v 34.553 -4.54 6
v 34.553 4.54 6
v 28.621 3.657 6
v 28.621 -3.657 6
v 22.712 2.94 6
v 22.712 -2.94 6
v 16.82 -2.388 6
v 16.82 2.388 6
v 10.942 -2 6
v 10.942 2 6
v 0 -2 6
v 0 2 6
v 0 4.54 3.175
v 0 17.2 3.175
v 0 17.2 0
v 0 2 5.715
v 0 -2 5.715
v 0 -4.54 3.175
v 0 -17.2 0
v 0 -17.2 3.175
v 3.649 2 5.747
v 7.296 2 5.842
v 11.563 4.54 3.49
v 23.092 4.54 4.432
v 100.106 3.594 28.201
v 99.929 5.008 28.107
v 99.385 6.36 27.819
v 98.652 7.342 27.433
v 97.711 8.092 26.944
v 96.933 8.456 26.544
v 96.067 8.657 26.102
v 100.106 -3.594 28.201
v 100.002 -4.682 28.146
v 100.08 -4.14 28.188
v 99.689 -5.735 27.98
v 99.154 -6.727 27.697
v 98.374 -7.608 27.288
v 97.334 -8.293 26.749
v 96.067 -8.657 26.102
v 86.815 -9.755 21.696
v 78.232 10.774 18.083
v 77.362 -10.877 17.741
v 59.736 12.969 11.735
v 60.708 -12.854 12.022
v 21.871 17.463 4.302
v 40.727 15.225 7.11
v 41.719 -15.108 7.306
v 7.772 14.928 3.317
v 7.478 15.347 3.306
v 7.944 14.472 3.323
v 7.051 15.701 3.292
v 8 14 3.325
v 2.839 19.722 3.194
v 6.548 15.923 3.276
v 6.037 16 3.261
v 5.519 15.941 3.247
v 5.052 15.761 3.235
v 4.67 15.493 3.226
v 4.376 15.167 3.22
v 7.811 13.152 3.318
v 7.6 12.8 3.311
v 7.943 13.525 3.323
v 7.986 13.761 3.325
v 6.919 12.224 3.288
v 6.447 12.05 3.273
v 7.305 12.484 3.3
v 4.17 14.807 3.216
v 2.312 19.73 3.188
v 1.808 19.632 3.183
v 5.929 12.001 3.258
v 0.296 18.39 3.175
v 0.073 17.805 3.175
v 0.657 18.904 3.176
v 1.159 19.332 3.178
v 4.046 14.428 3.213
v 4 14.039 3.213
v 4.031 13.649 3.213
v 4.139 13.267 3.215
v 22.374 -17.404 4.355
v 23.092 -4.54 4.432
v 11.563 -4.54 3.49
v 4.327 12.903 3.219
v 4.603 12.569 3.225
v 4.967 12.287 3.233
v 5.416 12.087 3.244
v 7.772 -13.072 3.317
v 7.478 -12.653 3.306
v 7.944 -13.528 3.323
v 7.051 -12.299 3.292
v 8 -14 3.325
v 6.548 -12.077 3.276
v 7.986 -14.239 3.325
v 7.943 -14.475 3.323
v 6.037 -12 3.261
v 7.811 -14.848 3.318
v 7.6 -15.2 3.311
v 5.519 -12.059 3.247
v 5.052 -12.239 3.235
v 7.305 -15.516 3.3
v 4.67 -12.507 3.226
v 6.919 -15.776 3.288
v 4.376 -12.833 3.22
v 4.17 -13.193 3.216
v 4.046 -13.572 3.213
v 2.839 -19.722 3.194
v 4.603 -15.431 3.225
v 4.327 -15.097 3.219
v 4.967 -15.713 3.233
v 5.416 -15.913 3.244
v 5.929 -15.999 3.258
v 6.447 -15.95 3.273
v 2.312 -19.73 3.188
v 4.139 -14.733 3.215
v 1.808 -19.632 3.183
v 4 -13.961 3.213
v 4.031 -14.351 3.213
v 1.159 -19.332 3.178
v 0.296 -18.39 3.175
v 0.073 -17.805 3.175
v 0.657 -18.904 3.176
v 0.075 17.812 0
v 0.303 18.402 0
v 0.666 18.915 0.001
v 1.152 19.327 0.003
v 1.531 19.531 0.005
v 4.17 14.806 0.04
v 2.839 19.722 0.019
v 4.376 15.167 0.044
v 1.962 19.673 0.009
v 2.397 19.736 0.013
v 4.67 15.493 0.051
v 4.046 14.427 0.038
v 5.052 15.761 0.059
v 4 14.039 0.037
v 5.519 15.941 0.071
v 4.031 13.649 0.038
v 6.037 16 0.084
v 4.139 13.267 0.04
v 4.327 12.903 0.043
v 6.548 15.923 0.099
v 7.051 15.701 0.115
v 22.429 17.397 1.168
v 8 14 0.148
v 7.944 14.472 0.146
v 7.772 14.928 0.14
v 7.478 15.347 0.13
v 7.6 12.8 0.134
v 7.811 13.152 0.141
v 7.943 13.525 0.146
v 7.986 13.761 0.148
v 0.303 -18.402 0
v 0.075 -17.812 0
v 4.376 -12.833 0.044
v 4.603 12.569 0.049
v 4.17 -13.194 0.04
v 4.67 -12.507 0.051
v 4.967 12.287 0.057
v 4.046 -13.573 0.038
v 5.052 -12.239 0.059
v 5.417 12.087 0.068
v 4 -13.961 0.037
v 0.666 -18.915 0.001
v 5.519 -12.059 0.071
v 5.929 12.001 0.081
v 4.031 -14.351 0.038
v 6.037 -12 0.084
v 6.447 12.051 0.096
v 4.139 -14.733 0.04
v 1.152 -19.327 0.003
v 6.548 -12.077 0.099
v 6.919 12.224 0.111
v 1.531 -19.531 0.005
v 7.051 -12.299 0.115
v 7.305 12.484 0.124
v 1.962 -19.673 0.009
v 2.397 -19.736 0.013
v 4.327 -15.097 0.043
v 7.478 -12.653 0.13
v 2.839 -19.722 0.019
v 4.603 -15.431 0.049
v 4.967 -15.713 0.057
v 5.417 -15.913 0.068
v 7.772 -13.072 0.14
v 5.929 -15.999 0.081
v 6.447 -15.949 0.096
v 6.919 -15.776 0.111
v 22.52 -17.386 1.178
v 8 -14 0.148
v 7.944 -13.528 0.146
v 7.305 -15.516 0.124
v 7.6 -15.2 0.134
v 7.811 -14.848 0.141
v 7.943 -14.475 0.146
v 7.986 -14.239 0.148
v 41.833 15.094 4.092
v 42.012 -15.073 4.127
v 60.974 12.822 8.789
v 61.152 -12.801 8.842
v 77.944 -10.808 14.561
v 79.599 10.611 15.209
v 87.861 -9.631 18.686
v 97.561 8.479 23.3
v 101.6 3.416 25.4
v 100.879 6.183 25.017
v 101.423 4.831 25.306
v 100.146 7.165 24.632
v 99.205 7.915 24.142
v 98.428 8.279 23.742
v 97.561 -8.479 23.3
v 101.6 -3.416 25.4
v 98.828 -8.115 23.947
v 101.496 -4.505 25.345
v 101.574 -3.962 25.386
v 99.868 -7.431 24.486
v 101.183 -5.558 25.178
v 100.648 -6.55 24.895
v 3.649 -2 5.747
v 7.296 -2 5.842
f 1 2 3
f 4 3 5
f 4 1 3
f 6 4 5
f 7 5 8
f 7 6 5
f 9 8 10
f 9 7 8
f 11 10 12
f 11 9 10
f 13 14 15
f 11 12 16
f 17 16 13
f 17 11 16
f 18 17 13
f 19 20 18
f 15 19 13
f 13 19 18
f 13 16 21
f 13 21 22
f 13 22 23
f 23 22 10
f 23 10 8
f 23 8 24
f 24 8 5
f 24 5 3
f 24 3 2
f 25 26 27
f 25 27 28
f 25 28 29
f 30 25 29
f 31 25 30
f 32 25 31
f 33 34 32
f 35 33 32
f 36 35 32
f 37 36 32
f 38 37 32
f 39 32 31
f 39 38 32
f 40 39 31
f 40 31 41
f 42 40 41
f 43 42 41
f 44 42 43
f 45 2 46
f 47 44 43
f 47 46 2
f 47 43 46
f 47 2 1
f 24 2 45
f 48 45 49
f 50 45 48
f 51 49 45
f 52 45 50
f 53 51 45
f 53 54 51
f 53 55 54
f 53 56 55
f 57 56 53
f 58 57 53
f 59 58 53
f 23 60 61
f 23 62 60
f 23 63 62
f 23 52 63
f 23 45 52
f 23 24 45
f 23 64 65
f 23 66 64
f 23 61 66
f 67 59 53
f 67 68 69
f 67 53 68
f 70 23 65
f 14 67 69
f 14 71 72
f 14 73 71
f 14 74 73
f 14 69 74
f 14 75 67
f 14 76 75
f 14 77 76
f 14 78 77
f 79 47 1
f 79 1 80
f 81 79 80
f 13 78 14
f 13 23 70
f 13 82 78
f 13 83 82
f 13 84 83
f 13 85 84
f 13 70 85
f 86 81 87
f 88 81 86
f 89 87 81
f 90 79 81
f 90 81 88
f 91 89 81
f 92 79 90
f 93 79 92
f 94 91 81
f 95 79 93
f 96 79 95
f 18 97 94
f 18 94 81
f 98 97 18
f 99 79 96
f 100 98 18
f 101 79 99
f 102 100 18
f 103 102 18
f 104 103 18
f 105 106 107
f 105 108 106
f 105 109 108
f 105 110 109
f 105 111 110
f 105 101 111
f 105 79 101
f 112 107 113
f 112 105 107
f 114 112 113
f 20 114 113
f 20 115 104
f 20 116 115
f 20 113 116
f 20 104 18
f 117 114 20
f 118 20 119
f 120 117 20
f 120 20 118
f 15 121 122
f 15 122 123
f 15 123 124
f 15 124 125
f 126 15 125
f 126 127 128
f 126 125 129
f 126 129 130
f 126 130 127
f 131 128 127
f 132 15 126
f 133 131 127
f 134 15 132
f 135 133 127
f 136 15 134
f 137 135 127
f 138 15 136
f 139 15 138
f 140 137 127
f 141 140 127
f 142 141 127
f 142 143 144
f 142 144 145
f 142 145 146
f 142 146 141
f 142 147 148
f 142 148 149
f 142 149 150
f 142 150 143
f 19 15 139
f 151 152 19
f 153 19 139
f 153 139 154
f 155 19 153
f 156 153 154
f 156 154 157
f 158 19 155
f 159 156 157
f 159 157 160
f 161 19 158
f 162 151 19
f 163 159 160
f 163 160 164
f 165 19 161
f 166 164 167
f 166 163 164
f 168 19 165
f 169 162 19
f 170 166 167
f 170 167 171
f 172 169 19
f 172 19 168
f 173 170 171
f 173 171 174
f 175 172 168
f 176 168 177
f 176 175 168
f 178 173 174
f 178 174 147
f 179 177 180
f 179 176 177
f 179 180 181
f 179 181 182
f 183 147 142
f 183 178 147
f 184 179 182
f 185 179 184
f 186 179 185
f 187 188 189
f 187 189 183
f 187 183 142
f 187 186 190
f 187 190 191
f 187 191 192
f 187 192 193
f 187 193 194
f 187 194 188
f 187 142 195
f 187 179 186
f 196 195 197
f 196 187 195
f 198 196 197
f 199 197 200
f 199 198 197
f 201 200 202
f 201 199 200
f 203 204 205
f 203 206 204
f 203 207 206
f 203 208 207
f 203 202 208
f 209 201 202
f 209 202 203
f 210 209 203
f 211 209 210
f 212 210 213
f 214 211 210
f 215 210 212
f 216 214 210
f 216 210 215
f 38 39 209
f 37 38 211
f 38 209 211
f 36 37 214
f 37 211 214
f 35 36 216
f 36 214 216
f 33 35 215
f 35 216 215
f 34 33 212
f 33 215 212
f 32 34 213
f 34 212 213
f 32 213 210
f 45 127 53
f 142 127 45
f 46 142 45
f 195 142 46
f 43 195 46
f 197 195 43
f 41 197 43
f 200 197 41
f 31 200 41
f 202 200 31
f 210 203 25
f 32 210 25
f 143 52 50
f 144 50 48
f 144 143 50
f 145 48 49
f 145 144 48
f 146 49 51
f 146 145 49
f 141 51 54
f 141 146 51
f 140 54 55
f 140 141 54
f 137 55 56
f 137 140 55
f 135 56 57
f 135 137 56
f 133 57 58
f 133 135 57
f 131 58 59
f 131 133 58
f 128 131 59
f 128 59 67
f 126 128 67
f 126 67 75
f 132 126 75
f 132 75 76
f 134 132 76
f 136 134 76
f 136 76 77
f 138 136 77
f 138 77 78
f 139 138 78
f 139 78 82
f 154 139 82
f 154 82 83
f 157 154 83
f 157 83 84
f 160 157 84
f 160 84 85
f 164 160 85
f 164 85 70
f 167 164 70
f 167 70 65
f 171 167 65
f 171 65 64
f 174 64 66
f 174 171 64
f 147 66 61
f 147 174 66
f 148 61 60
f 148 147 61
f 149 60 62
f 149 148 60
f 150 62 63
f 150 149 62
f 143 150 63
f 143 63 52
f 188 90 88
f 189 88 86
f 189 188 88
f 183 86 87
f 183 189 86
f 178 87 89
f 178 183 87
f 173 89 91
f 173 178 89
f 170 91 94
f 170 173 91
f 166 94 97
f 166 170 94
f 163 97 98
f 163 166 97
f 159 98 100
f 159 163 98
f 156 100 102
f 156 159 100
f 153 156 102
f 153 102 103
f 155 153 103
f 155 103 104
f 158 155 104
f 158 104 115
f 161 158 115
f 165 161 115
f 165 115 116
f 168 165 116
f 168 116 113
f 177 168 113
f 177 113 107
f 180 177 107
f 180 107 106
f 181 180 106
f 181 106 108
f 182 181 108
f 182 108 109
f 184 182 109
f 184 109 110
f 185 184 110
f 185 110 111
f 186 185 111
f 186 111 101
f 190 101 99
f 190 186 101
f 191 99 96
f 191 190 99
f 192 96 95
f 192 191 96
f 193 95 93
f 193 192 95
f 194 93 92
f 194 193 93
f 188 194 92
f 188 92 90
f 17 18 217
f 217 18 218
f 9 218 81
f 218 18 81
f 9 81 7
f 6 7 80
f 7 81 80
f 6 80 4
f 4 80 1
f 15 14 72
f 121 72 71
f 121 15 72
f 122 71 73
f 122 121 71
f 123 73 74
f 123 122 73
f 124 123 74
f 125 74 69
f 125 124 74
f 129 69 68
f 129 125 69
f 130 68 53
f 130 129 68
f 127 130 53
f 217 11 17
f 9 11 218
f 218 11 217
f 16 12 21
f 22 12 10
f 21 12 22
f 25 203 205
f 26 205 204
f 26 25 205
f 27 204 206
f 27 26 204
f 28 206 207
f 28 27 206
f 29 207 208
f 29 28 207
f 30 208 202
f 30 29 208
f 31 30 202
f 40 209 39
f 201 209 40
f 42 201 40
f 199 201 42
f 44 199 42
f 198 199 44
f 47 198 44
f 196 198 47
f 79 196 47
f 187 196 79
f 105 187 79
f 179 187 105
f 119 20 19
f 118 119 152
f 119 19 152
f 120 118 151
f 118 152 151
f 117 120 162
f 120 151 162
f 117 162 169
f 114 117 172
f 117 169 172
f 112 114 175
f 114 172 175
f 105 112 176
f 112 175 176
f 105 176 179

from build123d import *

# Parameters (mm, degrees)
F1_DEPTH      = 20
F1_DEPTH_BACK = 20
F2_R          = 2
F3_DEPTH      = 25.4
F5_DEPTH      = 50.8
F7_DEPTH      = 2
F7_DEPTH_BACK = 2
F8_SIZE       = 2.54
F9_R          = 5.08
F10_T1_DEPTH  = 15.875
F11_T1_DEPTH  = 18.9511481059


# Not quite as in the source:
# - a fillet or chamfer that OpenCascade refuses, or shapes differently, is made with other operations: its cross-section is extruded or revolved along the edge and cut away or added


with BuildPart() as f1:
    # F0 (on Front) → F1 (new body, two sides)
    with BuildSketch(Plane.XZ) as f1_sk:
        with BuildLine():
            Line((0, 3.175), (0, 0))
            ThreePointArc((0, 0), (52.3634414453, 6.4462342186), (101.6, 25.4))
            Line((101.6, 25.4), (100.1058823529, 28.2014705882))
            ThreePointArc((100.1058823529, 28.2014705882), (51.5933908359, 9.5264366566), (0, 3.175))
        make_face()
    extrude(amount=F1_DEPTH)
    extrude(f1_sk.sketch, amount=-F1_DEPTH_BACK)

    # F2 (on Top) → F3 (cut)
    with BuildSketch(Plane.XY):
        with Locations((6, 14)):
            Circle(F2_R)
        with Locations((6, -14)):
            Circle(F2_R)
    extrude(amount=F3_DEPTH, mode=Mode.SUBTRACT)

    # F4 (on Top) → F5 (cut)
    with BuildSketch(Plane.XY):
        Polygon((0.5, 20), (101.6, 8), (101.6, 20), align=None)
        Polygon((101.6, -8), (0.5, -20), (101.6, -20), align=None)
    extrude(amount=F5_DEPTH, mode=Mode.SUBTRACT)

    # F6 (on Front) → F7 (join, two sides)
    with BuildSketch(Plane.XZ) as f7_sk:
        Polygon((0, 6), (0, 0), (37, 6), align=None)
    extrude(amount=F7_DEPTH)
    extrude(f7_sk.sketch, amount=-F7_DEPTH_BACK)

    # F8
    f8_edges = [f1.edges().sort_by_distance(p)[0] for p in [
        (17.334188, -2, 3.882426),
        (17.334188, 2, 3.882426),
    ]]
    chamfer(f8_edges, length=F8_SIZE)

    # F9
    f9_edges = [f1.edges().sort_by_distance(p)[0] for p in [
        (100.852941, -8.088672, 26.800735),
        (100.852941, 8.088672, 26.800735),
    ]]
    fillet(f9_edges, radius=F9_R)

    # F10: fillet of radius 2.54 on 2 edges, made by hand

    # F10_s2 → F10_t1 (cut)
    with BuildSketch(Plane.XY.offset(-6.35)):
        with BuildLine():
            ThreePointArc((0, -17.46), (0.7439487758, -19.2560512242), (2.54, -20))
            Line((2.54, -20), (0, -20))
            Line((0, -20), (0, -17.46))
        make_face()
        with BuildLine():
            ThreePointArc((2.54, 20), (0.7439487758, 19.2560512242), (0, 17.46))
            Line((0, 17.46), (0, 20))
            Line((0, 20), (2.54, 20))
        make_face()
    extrude(amount=F10_T1_DEPTH, mode=Mode.SUBTRACT)

    # F11: fillet of radius 2.54 on 2 edges, made by hand

    # F11_s2 → F11_t1 (cut)
    with BuildSketch(Plane.XY.offset(-7.8813228745)):
        with BuildLine():
            ThreePointArc((0, -17.2000338729), (0.8531139151, -19.0989849877), (2.8393821549, -19.7223285276))
            Line((2.8393821549, -19.7223285276), (2.8693203704, -19.9745579931))
            Line((2.8693203704, -19.9745579931), (1.7309730402, -20.1096734032))
            Line((1.7309730402, -20.1096734032), (1.6171383071, -20.0971883315))
            ThreePointArc((1.6171383071, -20.0971883315), (-0.254, -17.46), (-0.254, -17.2000338729))
            Line((-0.254, -17.2000338729), (0, -17.2000338729))
        make_face()
        with BuildLine():
            ThreePointArc((0, 17.2000338729), (0.8531139151, 19.0989849877), (2.8393821549, 19.7223285276))
            Line((2.8393821549, 19.7223285276), (2.8693203704, 19.9745579931))
            Line((2.8693203704, 19.9745579931), (1.7309730402, 20.1096734032))
            Line((1.7309730402, 20.1096734032), (1.6171383071, 20.0971883315))
            ThreePointArc((1.6171383071, 20.0971883315), (-0.254, 17.46), (-0.254, 17.2000338729))
            Line((-0.254, 17.2000338729), (0, 17.2000338729))
        make_face()
    extrude(amount=F11_T1_DEPTH, mode=Mode.SUBTRACT)


solid = f1.part
